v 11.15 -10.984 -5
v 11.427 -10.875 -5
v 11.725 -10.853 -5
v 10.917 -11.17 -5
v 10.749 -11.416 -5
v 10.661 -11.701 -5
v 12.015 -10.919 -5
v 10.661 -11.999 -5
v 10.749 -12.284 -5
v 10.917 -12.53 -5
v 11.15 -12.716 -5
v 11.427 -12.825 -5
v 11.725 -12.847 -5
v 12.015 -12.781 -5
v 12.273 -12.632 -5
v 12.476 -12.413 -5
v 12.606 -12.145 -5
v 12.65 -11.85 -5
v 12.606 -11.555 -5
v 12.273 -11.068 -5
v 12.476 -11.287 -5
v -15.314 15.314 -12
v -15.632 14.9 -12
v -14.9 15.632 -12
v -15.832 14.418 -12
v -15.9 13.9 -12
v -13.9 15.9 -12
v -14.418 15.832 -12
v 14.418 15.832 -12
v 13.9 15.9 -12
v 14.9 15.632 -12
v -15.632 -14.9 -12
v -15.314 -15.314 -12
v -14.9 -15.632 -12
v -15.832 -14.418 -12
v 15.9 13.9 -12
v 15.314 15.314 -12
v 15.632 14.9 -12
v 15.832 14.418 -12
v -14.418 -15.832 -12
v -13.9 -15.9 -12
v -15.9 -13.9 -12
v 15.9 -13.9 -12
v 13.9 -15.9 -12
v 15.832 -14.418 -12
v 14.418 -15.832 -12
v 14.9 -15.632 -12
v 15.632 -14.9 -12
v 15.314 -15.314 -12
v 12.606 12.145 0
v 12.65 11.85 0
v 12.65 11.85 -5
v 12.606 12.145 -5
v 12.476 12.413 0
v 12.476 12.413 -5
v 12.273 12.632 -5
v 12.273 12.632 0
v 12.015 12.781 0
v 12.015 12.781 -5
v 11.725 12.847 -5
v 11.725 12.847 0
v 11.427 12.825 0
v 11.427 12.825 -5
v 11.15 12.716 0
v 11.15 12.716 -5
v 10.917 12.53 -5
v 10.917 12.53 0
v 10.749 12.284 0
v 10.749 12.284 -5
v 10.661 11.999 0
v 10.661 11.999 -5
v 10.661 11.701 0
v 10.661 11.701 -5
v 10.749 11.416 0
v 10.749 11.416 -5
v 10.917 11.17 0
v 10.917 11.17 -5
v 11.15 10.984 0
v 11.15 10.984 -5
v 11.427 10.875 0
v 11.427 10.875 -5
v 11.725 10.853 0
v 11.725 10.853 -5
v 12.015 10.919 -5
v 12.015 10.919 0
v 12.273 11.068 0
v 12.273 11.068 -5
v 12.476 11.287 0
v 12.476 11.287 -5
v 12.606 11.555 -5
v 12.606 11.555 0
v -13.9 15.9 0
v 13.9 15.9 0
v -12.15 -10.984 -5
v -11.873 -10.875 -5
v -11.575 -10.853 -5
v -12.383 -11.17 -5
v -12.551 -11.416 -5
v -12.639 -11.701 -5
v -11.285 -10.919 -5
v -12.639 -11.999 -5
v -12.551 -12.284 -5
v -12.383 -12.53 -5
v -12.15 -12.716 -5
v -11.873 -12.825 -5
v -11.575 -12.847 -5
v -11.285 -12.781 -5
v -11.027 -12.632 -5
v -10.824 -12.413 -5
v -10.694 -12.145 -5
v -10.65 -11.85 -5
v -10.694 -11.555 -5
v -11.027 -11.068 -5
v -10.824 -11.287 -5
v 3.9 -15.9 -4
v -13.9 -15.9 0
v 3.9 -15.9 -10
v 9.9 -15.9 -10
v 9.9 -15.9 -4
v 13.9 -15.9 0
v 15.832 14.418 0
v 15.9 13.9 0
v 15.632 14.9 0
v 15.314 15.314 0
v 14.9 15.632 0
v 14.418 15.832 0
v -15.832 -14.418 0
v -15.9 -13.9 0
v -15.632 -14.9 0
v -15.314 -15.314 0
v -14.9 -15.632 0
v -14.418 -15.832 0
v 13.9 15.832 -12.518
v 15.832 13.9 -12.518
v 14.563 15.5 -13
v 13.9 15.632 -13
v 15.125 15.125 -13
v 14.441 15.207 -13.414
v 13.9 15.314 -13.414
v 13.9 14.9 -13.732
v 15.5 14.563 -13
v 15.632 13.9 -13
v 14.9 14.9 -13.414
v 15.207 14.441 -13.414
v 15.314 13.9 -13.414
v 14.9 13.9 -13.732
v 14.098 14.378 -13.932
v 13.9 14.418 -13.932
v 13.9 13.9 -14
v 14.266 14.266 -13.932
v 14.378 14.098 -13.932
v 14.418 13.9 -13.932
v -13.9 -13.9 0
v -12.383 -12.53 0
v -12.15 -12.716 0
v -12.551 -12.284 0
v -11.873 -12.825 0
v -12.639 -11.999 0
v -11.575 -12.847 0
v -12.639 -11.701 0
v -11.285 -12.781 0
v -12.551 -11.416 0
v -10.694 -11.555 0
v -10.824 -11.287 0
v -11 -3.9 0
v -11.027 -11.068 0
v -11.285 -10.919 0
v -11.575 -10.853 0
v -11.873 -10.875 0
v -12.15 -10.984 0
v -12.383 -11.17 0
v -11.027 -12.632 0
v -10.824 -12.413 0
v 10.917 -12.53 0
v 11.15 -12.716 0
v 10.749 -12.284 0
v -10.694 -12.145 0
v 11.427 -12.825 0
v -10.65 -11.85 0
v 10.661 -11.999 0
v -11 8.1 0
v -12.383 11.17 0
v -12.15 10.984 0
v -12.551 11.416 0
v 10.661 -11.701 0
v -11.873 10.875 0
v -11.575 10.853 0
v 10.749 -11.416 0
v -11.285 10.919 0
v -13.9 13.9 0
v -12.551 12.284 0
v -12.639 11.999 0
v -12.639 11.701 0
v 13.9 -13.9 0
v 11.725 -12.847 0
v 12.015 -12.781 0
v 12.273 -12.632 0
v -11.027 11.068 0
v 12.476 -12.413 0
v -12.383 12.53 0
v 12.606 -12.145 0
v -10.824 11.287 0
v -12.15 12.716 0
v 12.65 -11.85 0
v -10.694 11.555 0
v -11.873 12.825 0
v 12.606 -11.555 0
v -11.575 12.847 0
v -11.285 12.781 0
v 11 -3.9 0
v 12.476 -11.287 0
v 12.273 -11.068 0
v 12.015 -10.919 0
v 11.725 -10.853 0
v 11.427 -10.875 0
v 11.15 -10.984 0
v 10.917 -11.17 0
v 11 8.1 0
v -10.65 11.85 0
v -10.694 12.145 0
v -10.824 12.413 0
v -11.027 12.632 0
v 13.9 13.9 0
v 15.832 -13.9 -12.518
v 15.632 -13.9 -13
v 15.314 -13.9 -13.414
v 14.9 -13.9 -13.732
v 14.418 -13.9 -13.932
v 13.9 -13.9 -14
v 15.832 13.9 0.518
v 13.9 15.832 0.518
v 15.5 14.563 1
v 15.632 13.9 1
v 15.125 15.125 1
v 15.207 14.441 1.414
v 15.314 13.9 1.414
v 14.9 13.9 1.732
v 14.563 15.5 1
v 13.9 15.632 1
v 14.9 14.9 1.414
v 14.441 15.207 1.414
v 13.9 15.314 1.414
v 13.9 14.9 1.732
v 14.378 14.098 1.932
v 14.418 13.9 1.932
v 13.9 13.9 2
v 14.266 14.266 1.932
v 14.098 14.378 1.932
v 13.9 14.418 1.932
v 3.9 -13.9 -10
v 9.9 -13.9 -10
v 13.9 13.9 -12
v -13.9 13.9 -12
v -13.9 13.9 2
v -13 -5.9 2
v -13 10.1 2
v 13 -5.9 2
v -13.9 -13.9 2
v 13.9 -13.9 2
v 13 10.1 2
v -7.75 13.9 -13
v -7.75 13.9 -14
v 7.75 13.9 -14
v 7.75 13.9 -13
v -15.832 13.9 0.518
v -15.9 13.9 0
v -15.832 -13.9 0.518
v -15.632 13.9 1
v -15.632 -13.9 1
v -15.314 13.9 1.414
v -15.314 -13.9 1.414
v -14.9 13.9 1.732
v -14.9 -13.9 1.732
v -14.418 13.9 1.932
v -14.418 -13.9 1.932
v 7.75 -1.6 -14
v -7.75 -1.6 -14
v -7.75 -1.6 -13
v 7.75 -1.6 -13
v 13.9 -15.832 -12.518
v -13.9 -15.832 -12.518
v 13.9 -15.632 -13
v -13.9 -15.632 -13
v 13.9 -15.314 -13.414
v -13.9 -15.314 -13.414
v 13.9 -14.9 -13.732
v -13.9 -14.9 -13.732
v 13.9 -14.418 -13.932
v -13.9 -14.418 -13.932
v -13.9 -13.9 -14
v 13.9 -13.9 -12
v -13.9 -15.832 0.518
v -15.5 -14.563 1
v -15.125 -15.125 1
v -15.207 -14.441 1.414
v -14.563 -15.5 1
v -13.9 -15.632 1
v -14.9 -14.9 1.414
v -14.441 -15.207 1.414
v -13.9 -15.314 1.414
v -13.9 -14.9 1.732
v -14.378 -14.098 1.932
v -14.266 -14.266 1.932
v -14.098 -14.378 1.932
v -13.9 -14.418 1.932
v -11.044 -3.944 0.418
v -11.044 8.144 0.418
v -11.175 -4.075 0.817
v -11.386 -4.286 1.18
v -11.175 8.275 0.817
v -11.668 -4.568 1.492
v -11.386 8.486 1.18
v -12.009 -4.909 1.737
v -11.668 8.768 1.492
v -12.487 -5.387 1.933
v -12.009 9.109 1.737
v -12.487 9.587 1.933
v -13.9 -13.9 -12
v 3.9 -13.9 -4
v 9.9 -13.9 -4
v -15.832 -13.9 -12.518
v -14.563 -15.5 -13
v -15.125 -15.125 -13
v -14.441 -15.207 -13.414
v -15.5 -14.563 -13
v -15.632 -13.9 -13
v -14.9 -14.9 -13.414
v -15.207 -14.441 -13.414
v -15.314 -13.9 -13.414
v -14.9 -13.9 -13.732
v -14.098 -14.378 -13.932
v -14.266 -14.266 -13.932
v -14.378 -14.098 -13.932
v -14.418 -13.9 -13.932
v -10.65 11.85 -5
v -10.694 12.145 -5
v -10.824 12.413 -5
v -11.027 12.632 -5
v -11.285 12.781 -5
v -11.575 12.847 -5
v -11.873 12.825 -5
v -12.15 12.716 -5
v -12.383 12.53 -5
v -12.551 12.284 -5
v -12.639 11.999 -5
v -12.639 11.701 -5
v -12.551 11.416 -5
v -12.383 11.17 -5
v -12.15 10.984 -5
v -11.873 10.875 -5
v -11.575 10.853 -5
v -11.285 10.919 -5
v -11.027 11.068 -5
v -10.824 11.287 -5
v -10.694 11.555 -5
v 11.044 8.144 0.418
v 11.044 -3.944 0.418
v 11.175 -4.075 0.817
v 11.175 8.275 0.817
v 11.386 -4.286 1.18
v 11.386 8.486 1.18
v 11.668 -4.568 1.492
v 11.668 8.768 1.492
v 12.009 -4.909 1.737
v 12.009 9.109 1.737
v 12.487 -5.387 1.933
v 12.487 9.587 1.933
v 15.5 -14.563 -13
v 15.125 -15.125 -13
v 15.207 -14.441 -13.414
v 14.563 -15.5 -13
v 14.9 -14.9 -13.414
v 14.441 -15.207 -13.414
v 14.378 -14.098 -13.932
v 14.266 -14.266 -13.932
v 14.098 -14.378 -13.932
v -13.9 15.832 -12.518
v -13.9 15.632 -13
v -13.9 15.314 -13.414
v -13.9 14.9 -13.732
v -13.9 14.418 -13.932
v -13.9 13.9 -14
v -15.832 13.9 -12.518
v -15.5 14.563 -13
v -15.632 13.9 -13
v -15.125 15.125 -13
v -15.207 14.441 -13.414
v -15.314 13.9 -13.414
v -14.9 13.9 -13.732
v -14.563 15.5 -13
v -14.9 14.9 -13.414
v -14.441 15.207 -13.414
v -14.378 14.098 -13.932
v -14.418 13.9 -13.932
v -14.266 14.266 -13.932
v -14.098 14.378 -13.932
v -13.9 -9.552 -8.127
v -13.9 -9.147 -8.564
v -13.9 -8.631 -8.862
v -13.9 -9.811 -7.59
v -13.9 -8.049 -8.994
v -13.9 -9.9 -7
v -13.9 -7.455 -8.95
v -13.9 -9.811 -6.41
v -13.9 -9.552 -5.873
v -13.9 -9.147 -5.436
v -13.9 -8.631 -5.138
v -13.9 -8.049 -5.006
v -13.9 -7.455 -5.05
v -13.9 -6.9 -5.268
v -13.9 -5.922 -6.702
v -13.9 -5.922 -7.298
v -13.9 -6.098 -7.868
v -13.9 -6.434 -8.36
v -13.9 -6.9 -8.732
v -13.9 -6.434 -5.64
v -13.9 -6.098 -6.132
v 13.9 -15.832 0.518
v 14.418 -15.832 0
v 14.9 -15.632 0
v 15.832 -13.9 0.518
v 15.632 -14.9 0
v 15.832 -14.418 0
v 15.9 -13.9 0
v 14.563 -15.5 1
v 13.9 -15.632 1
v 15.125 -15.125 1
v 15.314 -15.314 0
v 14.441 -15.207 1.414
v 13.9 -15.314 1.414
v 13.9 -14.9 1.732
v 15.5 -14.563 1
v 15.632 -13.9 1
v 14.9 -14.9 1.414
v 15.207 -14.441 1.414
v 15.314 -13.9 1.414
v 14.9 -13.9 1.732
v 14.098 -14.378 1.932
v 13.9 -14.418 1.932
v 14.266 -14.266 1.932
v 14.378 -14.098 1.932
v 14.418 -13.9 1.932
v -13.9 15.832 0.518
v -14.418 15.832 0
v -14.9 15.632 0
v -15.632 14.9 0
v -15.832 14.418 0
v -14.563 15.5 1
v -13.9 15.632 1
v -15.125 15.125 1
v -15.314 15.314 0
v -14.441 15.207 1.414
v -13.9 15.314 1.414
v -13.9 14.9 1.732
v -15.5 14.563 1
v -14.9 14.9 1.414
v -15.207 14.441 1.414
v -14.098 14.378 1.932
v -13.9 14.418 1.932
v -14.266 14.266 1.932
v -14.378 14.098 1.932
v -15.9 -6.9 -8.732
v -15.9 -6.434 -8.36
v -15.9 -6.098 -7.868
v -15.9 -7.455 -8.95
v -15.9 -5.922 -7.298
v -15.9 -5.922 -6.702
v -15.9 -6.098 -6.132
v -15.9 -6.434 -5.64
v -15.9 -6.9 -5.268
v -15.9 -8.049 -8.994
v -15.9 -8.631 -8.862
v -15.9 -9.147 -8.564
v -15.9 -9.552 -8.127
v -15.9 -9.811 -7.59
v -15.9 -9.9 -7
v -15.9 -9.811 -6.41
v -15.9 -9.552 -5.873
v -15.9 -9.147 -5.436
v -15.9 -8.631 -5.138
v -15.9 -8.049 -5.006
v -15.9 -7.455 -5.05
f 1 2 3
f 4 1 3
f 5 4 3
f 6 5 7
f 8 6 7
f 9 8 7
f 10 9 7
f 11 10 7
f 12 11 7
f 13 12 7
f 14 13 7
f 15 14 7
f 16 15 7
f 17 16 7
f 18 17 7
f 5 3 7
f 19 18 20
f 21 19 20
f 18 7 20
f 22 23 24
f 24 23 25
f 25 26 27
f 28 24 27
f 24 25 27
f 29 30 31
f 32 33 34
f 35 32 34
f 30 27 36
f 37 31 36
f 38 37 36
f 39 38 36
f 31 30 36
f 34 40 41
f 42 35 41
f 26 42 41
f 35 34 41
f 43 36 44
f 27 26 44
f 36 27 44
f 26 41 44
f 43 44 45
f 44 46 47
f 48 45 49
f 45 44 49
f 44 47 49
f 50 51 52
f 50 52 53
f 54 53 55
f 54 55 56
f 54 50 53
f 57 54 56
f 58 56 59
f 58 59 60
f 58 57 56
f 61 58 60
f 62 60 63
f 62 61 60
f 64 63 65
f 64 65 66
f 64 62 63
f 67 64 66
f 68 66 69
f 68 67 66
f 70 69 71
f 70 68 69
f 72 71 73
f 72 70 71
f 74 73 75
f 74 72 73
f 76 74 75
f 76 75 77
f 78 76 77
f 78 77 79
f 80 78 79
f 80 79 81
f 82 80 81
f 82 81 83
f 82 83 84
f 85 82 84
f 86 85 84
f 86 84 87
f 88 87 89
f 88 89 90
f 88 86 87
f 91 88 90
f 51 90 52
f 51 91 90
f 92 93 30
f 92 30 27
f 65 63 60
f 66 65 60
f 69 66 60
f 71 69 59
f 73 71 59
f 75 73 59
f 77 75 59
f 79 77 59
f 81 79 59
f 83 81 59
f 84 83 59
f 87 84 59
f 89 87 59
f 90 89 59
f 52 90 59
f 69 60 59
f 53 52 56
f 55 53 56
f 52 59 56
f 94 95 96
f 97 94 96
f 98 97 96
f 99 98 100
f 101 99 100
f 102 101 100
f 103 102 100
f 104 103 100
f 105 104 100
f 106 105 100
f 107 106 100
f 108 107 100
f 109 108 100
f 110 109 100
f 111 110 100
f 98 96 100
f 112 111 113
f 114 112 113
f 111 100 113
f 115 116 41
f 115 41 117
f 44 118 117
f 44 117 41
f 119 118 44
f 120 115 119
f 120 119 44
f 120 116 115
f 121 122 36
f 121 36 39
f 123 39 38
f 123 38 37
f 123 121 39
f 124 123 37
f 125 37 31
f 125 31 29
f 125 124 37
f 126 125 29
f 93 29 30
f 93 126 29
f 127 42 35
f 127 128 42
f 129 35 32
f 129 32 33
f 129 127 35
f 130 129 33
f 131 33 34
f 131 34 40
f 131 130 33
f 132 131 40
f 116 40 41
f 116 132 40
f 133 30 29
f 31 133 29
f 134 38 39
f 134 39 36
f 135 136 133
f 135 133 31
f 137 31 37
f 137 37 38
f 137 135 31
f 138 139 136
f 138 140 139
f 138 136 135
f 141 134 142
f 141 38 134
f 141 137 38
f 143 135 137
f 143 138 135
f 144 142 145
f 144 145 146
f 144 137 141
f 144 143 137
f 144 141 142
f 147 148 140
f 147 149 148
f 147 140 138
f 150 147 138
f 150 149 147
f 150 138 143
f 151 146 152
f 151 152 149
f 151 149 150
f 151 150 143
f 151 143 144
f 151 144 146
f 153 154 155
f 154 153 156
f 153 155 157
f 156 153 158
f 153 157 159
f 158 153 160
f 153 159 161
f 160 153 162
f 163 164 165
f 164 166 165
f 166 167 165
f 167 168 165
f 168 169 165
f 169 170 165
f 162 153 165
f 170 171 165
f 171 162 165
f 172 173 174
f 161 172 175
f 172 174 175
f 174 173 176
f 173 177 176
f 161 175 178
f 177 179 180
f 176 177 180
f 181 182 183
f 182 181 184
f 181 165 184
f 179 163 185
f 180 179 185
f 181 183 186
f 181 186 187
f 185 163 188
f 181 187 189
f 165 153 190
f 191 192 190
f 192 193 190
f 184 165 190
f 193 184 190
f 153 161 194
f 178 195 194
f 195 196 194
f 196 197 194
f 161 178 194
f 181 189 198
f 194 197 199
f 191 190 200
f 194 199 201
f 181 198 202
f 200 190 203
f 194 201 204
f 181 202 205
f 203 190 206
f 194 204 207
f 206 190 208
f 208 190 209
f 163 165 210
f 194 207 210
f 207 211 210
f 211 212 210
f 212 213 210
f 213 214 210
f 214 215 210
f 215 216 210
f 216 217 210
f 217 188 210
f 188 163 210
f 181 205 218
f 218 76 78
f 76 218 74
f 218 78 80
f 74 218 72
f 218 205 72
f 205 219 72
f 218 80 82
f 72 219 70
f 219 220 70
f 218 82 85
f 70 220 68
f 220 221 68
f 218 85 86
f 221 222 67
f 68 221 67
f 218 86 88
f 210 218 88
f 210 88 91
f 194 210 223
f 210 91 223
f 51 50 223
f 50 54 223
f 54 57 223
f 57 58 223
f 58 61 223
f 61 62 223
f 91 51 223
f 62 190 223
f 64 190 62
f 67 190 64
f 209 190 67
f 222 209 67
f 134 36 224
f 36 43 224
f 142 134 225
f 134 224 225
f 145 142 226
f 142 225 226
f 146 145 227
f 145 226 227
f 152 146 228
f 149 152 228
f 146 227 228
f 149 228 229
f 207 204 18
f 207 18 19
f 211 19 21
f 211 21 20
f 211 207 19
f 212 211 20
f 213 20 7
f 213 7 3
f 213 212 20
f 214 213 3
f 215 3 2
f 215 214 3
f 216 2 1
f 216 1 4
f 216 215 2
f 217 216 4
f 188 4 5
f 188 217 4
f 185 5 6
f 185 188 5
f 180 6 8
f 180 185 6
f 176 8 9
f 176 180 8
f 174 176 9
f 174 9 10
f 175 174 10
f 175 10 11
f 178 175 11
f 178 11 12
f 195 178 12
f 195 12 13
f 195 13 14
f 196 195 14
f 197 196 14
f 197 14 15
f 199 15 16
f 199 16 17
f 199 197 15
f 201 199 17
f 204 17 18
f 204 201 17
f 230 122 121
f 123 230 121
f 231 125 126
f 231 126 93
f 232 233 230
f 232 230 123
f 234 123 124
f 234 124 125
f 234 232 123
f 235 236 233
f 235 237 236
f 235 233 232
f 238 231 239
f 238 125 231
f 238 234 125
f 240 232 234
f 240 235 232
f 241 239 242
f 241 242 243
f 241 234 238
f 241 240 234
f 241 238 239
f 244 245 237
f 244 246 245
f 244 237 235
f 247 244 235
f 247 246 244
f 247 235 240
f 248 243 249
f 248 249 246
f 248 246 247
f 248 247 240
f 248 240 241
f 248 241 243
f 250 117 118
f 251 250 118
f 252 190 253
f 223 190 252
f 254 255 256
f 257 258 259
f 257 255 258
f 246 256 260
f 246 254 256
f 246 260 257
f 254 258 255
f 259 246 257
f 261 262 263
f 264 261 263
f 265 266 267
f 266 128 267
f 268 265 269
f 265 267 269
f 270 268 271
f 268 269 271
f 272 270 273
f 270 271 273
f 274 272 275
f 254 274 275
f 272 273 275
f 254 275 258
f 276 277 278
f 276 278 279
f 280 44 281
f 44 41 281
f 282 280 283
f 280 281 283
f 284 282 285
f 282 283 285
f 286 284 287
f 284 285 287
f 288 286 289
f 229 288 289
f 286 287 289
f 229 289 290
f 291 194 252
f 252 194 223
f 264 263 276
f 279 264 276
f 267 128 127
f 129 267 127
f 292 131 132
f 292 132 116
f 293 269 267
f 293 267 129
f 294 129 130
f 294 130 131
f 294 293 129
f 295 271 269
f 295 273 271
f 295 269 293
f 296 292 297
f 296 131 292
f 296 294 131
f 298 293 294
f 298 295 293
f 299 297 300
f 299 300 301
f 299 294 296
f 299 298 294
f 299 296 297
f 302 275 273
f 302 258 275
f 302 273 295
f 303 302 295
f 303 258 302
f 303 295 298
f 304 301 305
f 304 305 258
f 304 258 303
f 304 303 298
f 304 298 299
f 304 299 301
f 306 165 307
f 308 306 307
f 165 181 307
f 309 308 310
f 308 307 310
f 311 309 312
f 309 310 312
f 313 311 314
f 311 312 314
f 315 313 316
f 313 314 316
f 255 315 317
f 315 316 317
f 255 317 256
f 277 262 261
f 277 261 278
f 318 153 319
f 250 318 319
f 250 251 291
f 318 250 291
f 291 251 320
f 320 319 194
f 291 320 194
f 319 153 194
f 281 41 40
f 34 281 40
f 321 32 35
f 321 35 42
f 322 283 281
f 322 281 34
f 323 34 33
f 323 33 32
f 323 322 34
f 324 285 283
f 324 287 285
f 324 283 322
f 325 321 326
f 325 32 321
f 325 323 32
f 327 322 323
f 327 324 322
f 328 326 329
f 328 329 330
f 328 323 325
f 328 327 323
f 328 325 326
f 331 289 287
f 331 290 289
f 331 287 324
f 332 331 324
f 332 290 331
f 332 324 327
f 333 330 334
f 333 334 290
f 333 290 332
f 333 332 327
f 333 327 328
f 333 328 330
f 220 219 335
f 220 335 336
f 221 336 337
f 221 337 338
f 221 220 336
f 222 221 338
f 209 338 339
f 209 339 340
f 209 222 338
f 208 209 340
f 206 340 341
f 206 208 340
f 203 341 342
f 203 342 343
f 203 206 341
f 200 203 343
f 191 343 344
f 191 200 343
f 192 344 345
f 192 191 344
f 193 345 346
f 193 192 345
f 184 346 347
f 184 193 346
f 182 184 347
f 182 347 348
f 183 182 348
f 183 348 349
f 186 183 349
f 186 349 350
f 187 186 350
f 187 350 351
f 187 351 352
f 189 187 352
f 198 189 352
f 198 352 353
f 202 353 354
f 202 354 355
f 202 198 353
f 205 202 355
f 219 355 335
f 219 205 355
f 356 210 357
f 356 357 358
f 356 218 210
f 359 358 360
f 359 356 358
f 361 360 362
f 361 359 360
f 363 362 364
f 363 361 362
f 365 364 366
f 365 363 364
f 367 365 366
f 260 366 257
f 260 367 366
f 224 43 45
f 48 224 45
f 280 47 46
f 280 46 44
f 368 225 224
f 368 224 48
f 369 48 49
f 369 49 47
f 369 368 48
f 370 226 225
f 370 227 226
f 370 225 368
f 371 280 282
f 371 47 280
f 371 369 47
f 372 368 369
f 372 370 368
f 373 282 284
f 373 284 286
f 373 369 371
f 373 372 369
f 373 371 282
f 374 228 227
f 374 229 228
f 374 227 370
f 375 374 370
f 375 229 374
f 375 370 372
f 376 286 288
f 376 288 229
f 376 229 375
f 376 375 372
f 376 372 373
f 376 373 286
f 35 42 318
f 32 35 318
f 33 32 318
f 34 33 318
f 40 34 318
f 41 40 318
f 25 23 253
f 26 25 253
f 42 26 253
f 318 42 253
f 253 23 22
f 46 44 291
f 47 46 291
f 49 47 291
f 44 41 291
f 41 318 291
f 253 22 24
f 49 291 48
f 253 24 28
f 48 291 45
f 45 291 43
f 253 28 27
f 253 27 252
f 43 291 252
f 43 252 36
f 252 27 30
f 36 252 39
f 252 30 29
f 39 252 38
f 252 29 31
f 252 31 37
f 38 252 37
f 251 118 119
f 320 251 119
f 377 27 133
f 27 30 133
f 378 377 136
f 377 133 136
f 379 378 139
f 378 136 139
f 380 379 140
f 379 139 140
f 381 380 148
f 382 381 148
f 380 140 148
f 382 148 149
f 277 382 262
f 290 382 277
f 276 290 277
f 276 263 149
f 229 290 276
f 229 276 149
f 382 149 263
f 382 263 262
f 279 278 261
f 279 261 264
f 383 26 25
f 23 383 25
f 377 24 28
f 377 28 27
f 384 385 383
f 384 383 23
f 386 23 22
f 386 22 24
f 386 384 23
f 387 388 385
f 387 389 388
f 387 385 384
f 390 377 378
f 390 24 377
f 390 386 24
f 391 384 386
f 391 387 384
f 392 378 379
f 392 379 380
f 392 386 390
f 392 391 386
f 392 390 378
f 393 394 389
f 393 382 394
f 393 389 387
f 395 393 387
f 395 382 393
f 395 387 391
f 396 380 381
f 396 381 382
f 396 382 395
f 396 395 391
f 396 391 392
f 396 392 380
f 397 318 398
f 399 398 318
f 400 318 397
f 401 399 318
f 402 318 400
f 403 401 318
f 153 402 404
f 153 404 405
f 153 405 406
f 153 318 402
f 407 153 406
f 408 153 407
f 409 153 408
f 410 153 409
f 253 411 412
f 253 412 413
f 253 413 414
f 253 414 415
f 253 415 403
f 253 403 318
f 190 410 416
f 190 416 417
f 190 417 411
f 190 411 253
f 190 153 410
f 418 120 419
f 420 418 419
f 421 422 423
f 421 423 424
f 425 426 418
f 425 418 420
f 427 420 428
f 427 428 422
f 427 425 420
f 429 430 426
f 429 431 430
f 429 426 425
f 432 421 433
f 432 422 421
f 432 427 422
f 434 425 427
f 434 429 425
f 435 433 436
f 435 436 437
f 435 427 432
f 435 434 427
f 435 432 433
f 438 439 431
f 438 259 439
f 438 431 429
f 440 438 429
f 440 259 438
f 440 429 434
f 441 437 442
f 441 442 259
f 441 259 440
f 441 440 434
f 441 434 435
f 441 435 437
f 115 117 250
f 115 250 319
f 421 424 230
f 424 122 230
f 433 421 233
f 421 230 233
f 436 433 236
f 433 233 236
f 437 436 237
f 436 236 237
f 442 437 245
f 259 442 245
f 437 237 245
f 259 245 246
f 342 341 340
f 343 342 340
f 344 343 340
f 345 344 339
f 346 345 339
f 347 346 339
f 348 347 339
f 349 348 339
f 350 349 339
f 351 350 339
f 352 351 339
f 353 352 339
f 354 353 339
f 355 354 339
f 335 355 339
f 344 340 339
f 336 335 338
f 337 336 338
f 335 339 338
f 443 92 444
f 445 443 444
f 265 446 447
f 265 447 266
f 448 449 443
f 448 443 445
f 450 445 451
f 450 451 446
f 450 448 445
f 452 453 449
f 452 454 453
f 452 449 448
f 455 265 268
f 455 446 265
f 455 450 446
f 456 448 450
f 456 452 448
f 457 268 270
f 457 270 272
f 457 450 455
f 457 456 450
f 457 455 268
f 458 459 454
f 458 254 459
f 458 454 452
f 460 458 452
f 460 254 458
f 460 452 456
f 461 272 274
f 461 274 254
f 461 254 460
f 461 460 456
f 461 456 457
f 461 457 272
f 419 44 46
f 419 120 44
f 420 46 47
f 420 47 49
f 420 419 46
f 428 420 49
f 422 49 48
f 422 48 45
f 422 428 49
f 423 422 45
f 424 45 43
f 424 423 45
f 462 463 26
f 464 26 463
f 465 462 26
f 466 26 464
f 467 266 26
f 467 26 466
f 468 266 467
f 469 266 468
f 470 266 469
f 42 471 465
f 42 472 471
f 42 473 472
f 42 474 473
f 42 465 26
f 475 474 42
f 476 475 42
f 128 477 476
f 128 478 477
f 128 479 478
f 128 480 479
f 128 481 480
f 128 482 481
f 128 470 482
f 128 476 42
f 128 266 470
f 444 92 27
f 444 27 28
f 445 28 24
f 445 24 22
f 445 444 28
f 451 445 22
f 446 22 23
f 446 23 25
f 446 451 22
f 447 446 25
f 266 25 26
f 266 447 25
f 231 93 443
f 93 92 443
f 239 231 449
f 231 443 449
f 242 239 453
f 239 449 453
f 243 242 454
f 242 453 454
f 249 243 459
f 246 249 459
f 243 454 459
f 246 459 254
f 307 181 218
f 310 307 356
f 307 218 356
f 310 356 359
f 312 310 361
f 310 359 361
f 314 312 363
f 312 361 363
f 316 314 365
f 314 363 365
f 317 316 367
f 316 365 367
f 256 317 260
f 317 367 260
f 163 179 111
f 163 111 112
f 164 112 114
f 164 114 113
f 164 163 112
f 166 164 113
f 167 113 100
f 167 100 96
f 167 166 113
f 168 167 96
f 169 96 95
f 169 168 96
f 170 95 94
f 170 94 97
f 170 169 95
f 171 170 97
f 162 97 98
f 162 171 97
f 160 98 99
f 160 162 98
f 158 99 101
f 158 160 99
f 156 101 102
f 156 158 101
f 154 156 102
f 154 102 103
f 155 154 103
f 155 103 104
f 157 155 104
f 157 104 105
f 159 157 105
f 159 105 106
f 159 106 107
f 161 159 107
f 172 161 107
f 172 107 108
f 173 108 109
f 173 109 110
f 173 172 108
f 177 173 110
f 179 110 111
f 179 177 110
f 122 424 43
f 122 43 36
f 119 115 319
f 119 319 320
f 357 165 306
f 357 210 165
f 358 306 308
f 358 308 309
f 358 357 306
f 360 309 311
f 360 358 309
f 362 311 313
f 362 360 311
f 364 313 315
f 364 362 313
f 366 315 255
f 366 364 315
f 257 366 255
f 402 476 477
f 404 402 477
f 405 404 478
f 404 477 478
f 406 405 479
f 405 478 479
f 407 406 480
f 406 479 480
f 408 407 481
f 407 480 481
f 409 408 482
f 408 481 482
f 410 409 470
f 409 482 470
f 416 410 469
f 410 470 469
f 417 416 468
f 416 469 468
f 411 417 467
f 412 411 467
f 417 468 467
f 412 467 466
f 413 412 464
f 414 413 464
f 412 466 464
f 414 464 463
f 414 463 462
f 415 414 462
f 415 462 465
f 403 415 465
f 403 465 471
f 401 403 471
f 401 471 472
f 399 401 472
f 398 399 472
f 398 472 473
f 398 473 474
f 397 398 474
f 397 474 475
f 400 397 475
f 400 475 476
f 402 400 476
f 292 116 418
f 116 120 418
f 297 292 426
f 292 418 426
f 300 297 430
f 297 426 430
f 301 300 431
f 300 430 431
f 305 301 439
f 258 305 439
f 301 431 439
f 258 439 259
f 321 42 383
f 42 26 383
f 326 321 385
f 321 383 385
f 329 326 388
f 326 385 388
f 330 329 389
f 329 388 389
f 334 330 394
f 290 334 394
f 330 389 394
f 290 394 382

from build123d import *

# Parameters (mm, degrees)
F0_W      = 27.8
F0_H      = 27.8
F0_R      = 1
F0_W_2    = 22
F0_H_2    = 12
F1_DEPTH  = 2
F2_R      = 1.99999
F3_DEPTH  = 12
F4_W      = 27.8
F4_H      = 27.8
F5_DEPTH  = 2
F7_W      = 6
F7_H      = 6
F8_DEPTH  = 5
F9_R      = 2
F10_DEPTH = 5
F11_DEPTH = 5
F12_R     = 1.99999
F13_W     = 15.5
F13_H     = 15.5
F14_DEPTH = 1


# Not quite as in the source:
# - a fillet or chamfer is up to 0.001 mm smaller than in the source, because OpenCascade refuses the exact size
# - a feature names something its author has since deleted; it is built from what else it names


with BuildPart() as f1:
    # F0 (on Top) → F1 (new body)
    with BuildSketch(Plane.XY):
        with BuildLine():
            ThreePointArc((13.9, -15.9), (15.3142135624, -15.3142135624), (15.9, -13.9))
            Line((15.9, -13.9), (15.9, 13.9))
            ThreePointArc((15.9, 13.9), (15.3142135624, 15.3142135624), (13.9, 15.9))
            Line((13.9, 15.9), (-13.9, 15.9))
            ThreePointArc((-13.9, 15.9), (-15.3142135624, 15.3142135624), (-15.9, 13.9))
            Line((-15.9, 13.9), (-15.9, -13.9))
            ThreePointArc((-15.9, -13.9), (-15.3142135624, -15.3142135624), (-13.9, -15.9))
            Line((-13.9, -15.9), (13.9, -15.9))
        make_face()
        Rectangle(F0_W, F0_H, mode=Mode.SUBTRACT)
        Rectangle(F0_W, F0_H)
        with Locations((-11.65, -11.85)):
            Circle(F0_R, mode=Mode.SUBTRACT)
        with Locations((11.65, -11.85)):
            Circle(F0_R, mode=Mode.SUBTRACT)
        with Locations((0, 2.1)):
            Rectangle(F0_W_2, F0_H_2, mode=Mode.SUBTRACT)
        with Locations((-11.65, 11.85)):
            Circle(F0_R, mode=Mode.SUBTRACT)
        with Locations((11.65, 11.85)):
            Circle(F0_R, mode=Mode.SUBTRACT)
        with Locations((-11.65, -11.85)):
            Circle(F0_R)
        with Locations((11.65, -11.85)):
            Circle(F0_R)
        with Locations((11.65, 11.85)):
            Circle(F0_R)
        with Locations((-11.65, 11.85)):
            Circle(F0_R)
    extrude(amount=F1_DEPTH)

    # F2 (radius 2 in the source; OpenCascade refuses exactly that, so slightly less here)
    f2_edges = [f1.edges().sort_by_distance(p)[0] for p in [
        (0, 8.1, 2),
        (-11, 2.1, 2),
        (11, 2.1, 2),
        (0, -3.9, 2),
        (-15.9, 0, 2),
    ]]
    fillet(f2_edges, radius=F2_R)

    # F0 (on Top) → F3 (join)
    with BuildSketch(Plane.XY):
        with BuildLine():
            ThreePointArc((13.9, -15.9), (15.3142135624, -15.3142135624), (15.9, -13.9))
            Line((15.9, -13.9), (15.9, 13.9))
            ThreePointArc((15.9, 13.9), (15.3142135624, 15.3142135624), (13.9, 15.9))
            Line((13.9, 15.9), (-13.9, 15.9))
            ThreePointArc((-13.9, 15.9), (-15.3142135624, 15.3142135624), (-15.9, 13.9))
            Line((-15.9, 13.9), (-15.9, -13.9))
            ThreePointArc((-15.9, -13.9), (-15.3142135624, -15.3142135624), (-13.9, -15.9))
            Line((-13.9, -15.9), (13.9, -15.9))
        make_face()
        Rectangle(F0_W, F0_H, mode=Mode.SUBTRACT)
    extrude(amount=-F3_DEPTH)


with BuildPart() as f5:
    # F4 (on face) → F5 (new body)
    with BuildSketch(Plane(origin=(0, 0, -12), x_dir=(1, 0, 0), z_dir=(0, 0, -1))):
        with BuildLine():
            ThreePointArc((-13.9, 15.9), (-15.3142135624, 15.3142135624), (-15.9, 13.9))
            Line((-15.9, 13.9), (-15.9, -13.9))
            ThreePointArc((-15.9, -13.9), (-15.3142135624, -15.3142135624), (-13.9, -15.9))
            Line((-13.9, -15.9), (13.9, -15.9))
            ThreePointArc((13.9, -15.9), (15.3142135624, -15.3142135624), (15.9, -13.9))
            Line((15.9, -13.9), (15.9, 13.9))
            ThreePointArc((15.9, 13.9), (15.3142135624, 15.3142135624), (13.9, 15.9))
            Line((13.9, 15.9), (-13.9, 15.9))
        make_face()
        Rectangle(F4_W, F4_H, mode=Mode.SUBTRACT)
        Rectangle(F4_W, F4_H)
    extrude(amount=F5_DEPTH)

    # F6: cut F1
    add(f1.part, mode=Mode.SUBTRACT)

    # F12 (radius 2 in the source; OpenCascade refuses exactly that, so slightly less here)
    f12_edges = [f5.edges().sort_by_distance(p)[0] for p in [
        (0, -15.9, -14),
    ]]
    fillet(f12_edges, radius=F12_R)

    # F13 (on face) → F14 (cut)
    with BuildSketch(Plane(origin=(0, 0, -14), x_dir=(1, 0, 0), z_dir=(0, 0, -1))):
        with Locations((0, -6.15)):
            Rectangle(F13_W, F13_H)
    extrude(amount=-F14_DEPTH, mode=Mode.SUBTRACT)


with BuildPart() as f1_1:
    add(f1.part)

    # F7 (on face) → F8 (cut)
    with BuildSketch(Plane.XZ.offset(15.9)):
        with Locations((6.9, -7)):
            Rectangle(F7_W, F7_H)
    extrude(amount=-F8_DEPTH, mode=Mode.SUBTRACT)

    # F9 (on face) → F10 (cut)
    with BuildSketch(Plane(origin=(-15.9, 0, 0), x_dir=(0, -1, 0), z_dir=(-1, 0, 0))):
        with Locations((7.9, -7)):
            Circle(F9_R)
    extrude(amount=-F10_DEPTH, mode=Mode.SUBTRACT)

    # F0 (on Top) → F11 (join)
    with BuildSketch(Plane.XY):
        with Locations((-11.65, -11.85)):
            Circle(F0_R)
        with Locations((11.65, -11.85)):
            Circle(F0_R)
        with Locations((-11.65, 11.85)):
            Circle(F0_R)
        with Locations((11.65, 11.85)):
            Circle(F0_R)
    extrude(amount=-F11_DEPTH)


solid = Compound([f5.part, f1_1.part])
